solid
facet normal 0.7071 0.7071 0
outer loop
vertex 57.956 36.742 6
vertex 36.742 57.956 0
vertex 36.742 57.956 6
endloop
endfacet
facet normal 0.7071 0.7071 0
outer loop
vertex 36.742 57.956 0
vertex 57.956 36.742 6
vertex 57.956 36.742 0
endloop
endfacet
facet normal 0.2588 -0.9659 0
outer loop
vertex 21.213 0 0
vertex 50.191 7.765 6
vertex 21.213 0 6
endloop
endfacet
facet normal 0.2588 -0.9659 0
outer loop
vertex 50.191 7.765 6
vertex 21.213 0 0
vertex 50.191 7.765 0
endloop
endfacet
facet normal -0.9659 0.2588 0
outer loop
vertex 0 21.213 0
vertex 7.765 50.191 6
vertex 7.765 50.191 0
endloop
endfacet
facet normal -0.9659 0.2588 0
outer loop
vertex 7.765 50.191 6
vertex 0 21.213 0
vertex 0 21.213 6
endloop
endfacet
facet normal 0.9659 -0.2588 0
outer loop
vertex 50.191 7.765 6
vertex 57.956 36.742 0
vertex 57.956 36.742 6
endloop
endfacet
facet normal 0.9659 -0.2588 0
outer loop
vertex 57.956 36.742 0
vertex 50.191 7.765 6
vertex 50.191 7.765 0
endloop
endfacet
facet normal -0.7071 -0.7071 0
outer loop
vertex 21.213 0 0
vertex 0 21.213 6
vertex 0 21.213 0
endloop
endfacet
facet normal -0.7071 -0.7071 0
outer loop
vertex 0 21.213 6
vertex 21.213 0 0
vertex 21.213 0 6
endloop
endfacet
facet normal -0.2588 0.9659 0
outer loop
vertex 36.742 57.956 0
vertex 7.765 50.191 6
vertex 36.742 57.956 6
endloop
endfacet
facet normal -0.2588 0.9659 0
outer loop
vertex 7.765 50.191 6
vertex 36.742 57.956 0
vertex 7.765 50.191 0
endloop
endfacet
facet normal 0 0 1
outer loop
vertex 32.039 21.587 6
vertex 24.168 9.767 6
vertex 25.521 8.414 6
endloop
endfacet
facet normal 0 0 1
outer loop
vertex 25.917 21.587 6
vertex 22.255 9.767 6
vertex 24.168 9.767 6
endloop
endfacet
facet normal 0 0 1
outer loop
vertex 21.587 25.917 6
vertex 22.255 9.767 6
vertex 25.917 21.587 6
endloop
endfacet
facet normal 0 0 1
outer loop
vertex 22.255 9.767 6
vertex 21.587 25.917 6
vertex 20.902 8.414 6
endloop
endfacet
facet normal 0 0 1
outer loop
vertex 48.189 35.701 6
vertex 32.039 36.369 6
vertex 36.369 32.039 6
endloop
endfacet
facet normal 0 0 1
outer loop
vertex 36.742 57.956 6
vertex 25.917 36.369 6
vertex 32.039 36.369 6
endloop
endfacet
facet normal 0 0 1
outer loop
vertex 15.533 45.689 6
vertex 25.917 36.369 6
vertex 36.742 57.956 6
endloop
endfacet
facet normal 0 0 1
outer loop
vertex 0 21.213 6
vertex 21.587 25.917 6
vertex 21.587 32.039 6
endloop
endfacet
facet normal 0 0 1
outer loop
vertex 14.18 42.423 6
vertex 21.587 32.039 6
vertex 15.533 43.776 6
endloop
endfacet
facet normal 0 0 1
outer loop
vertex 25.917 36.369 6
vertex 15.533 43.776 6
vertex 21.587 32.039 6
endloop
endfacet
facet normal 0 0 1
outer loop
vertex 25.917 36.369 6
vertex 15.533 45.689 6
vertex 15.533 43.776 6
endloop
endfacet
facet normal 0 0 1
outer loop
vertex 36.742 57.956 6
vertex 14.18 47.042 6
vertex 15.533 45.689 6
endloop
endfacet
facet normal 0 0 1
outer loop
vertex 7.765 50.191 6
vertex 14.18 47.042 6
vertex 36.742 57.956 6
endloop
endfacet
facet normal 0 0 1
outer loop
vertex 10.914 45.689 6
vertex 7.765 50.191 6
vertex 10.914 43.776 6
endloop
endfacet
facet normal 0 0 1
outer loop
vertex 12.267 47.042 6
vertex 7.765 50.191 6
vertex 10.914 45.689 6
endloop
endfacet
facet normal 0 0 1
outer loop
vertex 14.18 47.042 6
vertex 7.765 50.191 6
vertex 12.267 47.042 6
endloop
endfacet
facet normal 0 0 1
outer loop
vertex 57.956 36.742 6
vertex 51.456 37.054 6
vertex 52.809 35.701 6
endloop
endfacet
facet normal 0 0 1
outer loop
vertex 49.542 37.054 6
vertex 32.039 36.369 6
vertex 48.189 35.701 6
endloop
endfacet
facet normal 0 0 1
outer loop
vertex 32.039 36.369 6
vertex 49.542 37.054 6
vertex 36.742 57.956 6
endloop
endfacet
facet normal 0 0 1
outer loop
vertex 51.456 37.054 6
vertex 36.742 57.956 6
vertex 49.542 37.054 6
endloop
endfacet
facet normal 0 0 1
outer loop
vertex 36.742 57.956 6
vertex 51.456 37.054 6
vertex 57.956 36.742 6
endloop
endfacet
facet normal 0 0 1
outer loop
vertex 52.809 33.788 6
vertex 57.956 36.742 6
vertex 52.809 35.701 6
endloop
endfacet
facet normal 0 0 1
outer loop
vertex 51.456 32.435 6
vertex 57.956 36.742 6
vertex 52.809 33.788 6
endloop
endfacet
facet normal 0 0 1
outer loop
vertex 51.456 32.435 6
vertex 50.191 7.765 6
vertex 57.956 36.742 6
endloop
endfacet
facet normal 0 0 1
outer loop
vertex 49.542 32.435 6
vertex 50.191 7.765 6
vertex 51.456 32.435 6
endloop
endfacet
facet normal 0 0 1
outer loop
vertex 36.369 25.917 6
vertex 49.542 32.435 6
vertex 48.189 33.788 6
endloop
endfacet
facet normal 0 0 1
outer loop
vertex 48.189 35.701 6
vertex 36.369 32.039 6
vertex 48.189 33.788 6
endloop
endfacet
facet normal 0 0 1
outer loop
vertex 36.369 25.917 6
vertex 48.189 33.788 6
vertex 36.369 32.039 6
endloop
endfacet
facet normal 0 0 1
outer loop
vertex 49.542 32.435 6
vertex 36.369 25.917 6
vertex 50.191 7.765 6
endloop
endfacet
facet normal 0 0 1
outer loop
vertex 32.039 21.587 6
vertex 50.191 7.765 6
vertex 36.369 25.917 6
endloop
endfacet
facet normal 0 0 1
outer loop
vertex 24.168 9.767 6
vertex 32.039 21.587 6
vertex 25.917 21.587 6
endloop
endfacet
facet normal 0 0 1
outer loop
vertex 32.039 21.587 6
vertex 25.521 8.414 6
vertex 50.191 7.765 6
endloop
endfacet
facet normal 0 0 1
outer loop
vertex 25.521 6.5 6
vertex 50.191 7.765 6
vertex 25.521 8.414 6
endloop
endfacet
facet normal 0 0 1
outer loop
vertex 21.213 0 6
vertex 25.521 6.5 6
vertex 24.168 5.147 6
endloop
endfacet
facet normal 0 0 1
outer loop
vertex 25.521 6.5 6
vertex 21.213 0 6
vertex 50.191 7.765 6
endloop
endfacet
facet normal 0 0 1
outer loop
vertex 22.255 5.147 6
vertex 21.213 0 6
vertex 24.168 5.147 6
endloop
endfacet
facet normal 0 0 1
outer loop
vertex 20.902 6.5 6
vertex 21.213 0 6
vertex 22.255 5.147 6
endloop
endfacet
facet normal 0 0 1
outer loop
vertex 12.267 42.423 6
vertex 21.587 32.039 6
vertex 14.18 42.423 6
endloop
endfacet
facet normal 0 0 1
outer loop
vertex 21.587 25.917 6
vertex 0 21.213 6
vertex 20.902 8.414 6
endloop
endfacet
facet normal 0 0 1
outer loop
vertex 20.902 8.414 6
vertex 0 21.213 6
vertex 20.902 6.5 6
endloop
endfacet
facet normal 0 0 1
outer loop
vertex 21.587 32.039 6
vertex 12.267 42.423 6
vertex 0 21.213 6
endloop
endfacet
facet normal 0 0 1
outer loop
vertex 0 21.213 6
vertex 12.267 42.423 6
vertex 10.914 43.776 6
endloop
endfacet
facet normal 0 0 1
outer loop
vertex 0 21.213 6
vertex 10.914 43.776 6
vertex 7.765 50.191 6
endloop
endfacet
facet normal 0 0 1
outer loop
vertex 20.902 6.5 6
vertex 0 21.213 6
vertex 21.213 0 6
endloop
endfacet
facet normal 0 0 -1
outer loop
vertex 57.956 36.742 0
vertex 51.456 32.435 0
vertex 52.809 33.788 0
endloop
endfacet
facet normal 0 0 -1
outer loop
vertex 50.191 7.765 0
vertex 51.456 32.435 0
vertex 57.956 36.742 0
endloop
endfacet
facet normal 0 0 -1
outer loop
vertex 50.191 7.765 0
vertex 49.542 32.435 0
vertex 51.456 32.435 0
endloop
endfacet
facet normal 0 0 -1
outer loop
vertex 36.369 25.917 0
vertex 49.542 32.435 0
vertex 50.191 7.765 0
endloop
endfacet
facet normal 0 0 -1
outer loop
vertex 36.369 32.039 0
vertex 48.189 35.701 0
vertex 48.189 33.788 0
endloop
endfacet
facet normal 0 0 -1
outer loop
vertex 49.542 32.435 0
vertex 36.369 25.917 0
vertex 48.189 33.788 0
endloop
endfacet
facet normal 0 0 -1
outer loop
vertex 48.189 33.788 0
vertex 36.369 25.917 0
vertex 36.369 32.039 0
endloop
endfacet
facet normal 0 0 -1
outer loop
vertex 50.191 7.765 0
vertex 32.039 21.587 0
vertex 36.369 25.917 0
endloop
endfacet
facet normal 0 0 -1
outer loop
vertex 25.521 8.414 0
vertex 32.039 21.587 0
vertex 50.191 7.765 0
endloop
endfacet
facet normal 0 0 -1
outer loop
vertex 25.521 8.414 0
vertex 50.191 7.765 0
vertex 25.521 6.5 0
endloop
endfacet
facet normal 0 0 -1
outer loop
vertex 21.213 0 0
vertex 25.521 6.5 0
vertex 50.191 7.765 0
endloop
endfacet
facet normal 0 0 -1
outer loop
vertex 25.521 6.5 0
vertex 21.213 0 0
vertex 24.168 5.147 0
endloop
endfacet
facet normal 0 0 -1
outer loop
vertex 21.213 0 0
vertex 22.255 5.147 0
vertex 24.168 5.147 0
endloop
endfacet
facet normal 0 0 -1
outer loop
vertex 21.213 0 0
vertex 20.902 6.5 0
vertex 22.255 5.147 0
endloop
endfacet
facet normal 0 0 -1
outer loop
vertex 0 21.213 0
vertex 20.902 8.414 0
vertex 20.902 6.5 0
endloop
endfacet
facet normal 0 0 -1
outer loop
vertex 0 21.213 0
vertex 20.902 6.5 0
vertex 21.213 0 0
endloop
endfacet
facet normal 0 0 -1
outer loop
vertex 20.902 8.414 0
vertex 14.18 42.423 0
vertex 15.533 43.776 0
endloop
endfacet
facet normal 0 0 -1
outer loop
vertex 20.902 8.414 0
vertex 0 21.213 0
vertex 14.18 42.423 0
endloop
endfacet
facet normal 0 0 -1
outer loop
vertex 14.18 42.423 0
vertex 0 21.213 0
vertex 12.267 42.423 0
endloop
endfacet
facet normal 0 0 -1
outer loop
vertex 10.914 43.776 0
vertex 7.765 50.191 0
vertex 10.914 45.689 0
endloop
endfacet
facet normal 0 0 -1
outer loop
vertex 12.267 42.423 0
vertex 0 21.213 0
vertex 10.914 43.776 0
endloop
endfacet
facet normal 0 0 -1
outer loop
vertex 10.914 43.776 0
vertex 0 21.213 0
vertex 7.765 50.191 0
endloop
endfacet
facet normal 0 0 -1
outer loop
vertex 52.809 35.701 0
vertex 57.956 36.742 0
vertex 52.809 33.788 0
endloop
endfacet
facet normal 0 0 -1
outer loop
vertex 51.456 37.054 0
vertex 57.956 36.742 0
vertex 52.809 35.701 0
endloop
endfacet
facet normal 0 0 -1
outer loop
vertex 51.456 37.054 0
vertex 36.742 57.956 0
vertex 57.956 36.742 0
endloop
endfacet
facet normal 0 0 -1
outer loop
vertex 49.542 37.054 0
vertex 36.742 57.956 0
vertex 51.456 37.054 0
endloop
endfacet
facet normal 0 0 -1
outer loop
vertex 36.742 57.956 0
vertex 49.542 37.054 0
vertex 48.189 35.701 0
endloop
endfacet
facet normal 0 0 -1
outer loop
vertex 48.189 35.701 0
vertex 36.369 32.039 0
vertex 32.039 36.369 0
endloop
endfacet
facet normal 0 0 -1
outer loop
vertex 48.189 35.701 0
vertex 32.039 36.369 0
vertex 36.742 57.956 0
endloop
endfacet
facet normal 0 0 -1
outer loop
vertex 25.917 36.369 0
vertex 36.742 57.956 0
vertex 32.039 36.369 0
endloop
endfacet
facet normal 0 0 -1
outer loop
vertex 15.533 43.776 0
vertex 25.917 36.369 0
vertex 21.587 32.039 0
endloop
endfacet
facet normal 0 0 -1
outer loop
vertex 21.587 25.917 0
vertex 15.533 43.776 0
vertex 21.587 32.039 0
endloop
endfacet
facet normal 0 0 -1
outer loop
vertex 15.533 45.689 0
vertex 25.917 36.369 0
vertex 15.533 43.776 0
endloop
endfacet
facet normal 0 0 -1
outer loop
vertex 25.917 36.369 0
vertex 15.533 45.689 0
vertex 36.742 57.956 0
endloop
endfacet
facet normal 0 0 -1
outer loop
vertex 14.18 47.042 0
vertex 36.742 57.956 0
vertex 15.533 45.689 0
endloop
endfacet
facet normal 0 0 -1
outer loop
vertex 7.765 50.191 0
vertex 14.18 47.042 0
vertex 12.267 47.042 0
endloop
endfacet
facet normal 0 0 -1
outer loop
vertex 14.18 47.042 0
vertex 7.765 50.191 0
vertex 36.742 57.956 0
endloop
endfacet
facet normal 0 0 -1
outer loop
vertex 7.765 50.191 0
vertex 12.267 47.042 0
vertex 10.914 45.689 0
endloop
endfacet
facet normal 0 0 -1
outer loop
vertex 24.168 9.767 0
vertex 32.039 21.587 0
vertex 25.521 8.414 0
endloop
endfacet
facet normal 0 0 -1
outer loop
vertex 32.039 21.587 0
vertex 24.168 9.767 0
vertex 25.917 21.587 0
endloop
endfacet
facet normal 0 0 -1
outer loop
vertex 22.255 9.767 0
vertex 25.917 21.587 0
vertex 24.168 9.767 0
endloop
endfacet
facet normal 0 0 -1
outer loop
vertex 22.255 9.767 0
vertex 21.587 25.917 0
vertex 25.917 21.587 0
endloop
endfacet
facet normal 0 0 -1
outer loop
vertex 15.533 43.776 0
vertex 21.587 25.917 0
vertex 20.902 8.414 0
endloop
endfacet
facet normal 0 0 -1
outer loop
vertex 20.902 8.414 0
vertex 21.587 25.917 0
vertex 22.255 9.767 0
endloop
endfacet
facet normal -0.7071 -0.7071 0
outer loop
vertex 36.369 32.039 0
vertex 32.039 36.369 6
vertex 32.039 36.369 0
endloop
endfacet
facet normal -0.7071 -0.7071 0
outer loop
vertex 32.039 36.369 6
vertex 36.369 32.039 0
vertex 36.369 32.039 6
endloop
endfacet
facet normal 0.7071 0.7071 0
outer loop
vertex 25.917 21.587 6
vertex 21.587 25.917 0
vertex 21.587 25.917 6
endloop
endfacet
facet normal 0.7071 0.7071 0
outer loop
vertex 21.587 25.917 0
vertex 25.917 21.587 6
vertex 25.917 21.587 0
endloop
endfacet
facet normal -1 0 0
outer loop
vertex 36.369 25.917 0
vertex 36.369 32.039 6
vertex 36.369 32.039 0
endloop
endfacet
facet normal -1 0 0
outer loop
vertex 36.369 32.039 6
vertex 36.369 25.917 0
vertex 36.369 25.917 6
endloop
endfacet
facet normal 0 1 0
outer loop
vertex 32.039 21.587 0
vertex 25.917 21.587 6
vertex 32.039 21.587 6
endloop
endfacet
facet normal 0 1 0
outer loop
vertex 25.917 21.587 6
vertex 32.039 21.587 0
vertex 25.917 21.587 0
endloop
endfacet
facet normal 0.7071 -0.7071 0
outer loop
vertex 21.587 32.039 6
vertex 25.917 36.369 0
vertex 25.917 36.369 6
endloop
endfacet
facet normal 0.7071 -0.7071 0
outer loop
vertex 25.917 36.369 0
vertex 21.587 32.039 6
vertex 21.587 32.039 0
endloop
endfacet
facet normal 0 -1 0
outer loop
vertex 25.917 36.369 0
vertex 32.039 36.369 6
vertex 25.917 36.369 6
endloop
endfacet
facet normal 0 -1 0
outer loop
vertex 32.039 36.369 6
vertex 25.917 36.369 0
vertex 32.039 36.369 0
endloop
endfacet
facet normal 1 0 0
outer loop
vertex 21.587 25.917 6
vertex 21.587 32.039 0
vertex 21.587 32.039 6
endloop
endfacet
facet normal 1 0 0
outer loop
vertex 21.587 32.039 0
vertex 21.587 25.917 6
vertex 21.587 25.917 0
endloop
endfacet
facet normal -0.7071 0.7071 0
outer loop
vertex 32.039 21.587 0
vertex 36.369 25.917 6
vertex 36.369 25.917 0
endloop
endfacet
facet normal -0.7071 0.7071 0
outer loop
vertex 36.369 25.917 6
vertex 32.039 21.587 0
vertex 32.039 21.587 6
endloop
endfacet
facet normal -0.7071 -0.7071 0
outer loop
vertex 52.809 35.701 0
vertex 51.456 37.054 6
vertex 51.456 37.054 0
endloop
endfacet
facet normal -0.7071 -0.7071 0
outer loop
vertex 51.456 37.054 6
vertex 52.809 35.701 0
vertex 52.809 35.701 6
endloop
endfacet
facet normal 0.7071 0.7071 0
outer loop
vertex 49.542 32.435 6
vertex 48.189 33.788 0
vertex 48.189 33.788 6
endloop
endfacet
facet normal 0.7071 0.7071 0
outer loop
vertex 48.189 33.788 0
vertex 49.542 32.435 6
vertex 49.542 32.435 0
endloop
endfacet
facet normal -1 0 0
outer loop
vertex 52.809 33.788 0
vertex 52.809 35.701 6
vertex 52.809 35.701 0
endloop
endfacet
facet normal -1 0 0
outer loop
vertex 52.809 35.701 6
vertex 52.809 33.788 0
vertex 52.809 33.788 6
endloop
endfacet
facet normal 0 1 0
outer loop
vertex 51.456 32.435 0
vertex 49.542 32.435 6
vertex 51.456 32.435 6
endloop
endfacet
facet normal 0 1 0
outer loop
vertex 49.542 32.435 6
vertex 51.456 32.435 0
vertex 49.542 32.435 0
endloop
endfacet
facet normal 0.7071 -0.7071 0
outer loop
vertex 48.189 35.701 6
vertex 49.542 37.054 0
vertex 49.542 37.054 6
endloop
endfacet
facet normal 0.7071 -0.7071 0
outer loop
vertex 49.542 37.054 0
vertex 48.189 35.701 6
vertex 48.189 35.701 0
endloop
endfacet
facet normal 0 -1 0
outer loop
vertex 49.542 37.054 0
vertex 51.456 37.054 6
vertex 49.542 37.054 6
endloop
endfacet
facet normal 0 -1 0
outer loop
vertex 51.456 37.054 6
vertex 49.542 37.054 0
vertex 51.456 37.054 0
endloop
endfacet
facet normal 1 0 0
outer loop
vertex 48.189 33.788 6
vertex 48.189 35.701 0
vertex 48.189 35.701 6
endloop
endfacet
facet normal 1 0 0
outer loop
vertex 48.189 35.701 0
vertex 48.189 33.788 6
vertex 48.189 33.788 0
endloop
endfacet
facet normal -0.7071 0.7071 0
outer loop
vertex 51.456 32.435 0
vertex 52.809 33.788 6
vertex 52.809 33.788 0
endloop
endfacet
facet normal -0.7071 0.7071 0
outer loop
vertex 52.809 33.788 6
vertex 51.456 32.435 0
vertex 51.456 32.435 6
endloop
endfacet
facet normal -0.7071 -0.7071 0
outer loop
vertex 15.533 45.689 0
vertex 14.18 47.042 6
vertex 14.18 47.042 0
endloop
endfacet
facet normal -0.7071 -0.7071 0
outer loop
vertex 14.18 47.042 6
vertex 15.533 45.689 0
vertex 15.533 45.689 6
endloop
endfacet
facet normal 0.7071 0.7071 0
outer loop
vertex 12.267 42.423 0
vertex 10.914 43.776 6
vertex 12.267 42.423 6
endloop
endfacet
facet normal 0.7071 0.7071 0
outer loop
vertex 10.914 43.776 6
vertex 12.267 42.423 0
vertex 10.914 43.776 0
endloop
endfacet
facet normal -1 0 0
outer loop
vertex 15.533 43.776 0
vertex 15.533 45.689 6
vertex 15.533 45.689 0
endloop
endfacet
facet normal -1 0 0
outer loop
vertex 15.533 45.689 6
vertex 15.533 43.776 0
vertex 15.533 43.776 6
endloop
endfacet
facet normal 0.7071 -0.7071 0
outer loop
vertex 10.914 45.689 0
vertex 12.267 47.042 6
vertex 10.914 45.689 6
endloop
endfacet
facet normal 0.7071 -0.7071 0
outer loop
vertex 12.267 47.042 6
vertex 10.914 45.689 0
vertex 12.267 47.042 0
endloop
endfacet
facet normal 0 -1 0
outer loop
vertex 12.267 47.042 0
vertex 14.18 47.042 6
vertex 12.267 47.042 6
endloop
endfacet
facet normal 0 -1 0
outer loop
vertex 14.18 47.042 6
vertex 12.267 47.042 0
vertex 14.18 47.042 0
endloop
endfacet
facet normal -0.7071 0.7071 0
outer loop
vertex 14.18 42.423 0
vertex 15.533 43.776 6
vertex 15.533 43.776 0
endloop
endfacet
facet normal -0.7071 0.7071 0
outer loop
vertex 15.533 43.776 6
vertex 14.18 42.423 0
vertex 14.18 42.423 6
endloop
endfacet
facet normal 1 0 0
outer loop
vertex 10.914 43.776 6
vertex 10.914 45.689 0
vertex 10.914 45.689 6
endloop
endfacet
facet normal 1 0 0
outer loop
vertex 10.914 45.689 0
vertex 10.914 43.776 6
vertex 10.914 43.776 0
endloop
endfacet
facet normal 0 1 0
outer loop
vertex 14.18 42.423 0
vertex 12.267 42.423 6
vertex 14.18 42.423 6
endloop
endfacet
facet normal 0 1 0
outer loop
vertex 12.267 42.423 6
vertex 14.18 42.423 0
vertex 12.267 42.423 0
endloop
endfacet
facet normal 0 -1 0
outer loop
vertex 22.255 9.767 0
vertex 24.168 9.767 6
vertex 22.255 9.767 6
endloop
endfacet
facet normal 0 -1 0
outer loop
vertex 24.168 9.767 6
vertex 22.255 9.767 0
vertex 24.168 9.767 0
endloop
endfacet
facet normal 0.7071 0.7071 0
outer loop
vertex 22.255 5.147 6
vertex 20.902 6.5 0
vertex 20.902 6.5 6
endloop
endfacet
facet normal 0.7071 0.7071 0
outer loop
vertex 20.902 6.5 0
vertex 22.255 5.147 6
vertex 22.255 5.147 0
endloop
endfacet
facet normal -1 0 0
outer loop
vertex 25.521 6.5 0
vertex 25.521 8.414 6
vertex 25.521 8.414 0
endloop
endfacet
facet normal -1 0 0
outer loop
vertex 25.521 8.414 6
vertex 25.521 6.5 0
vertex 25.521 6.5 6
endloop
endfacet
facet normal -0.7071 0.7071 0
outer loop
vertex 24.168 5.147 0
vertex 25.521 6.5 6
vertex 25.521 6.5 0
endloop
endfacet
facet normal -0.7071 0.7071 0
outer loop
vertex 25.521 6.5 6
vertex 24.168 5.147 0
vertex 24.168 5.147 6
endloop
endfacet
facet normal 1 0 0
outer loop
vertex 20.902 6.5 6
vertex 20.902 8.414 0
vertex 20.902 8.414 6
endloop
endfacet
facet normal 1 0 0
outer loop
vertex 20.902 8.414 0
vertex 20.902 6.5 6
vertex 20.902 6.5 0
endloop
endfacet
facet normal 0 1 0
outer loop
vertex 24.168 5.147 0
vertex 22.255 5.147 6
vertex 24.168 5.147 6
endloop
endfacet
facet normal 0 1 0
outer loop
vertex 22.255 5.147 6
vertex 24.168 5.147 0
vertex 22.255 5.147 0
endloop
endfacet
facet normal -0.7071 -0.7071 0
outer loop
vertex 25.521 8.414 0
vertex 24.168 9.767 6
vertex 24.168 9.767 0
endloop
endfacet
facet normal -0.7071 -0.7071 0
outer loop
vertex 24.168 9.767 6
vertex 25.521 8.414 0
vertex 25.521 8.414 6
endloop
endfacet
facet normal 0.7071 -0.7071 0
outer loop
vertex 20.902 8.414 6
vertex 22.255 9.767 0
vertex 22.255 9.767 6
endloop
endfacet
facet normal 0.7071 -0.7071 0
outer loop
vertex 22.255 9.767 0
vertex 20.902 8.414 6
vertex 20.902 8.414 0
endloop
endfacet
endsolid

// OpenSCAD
$fn = 32;

// ----------------------------------------------------------------------
// Polygon plate: 6-gon R30, 3 bolt windows
// ----------------------------------------------------------------------

// --- parameters (mm) ---
sides = 6;                // number of polygon sides
plate_r = 30;             // circumscribed radius of the polygon
bore_r = 8;               // centre bore radius
bolts = 3;                // number of bolt windows
ring_r = 22.28;           // bolt-circle radius
bolt_r = 2.5;             // bolt window radius
plate_t = 6;              // plate thickness, Z (extrusion height)

plate_d = 2 * plate_r;  // circumscribed diameter
bore_d = 2 * bore_r;  // centre bore diameter
bolt_d = 2 * bolt_r;  // bolt window diameter
ring_d = 2 * ring_r;  // bolt-circle diameter

profile = [[57.956, 36.742], [36.742, 57.956], [7.765, 50.191], [0, 21.213], [21.213, 0], [50.191, 7.765]];  // primary outline, 6 points, counter clockwise
void_1 = [[36.369, 32.039], [32.039, 36.369], [25.917, 36.369], [21.587, 32.039], [21.587, 25.917], [25.917, 21.587], [32.039, 21.587], [36.369, 25.917]];  // centre bore, 8 points
void_2 = [[52.809, 35.701], [51.456, 37.054], [49.542, 37.054], [48.189, 35.701], [48.189, 33.788], [49.542, 32.435], [51.456, 32.435], [52.809, 33.788]];  // bolt window 1, 8 points
void_3 = [[15.533, 45.689], [14.18, 47.042], [12.267, 47.042], [10.914, 45.689], [10.914, 43.776], [12.267, 42.423], [14.18, 42.423], [15.533, 43.776]];  // bolt window 2, 8 points
void_4 = [[25.521, 8.414], [24.168, 9.767], [22.255, 9.767], [20.902, 8.414], [20.902, 6.5], [22.255, 5.147], [24.168, 5.147], [25.521, 6.5]];  // bolt window 3, 8 points

// --- the one profile operation ---
difference() {
  linear_extrude(height = plate_t) polygon(points = profile);
  translate([0, 0, -1])
    linear_extrude(height = plate_t + 2) polygon(points = void_1);
  translate([0, 0, -1])
    linear_extrude(height = plate_t + 2) polygon(points = void_2);
  translate([0, 0, -1])
    linear_extrude(height = plate_t + 2) polygon(points = void_3);
  translate([0, 0, -1])
    linear_extrude(height = plate_t + 2) polygon(points = void_4);
}
